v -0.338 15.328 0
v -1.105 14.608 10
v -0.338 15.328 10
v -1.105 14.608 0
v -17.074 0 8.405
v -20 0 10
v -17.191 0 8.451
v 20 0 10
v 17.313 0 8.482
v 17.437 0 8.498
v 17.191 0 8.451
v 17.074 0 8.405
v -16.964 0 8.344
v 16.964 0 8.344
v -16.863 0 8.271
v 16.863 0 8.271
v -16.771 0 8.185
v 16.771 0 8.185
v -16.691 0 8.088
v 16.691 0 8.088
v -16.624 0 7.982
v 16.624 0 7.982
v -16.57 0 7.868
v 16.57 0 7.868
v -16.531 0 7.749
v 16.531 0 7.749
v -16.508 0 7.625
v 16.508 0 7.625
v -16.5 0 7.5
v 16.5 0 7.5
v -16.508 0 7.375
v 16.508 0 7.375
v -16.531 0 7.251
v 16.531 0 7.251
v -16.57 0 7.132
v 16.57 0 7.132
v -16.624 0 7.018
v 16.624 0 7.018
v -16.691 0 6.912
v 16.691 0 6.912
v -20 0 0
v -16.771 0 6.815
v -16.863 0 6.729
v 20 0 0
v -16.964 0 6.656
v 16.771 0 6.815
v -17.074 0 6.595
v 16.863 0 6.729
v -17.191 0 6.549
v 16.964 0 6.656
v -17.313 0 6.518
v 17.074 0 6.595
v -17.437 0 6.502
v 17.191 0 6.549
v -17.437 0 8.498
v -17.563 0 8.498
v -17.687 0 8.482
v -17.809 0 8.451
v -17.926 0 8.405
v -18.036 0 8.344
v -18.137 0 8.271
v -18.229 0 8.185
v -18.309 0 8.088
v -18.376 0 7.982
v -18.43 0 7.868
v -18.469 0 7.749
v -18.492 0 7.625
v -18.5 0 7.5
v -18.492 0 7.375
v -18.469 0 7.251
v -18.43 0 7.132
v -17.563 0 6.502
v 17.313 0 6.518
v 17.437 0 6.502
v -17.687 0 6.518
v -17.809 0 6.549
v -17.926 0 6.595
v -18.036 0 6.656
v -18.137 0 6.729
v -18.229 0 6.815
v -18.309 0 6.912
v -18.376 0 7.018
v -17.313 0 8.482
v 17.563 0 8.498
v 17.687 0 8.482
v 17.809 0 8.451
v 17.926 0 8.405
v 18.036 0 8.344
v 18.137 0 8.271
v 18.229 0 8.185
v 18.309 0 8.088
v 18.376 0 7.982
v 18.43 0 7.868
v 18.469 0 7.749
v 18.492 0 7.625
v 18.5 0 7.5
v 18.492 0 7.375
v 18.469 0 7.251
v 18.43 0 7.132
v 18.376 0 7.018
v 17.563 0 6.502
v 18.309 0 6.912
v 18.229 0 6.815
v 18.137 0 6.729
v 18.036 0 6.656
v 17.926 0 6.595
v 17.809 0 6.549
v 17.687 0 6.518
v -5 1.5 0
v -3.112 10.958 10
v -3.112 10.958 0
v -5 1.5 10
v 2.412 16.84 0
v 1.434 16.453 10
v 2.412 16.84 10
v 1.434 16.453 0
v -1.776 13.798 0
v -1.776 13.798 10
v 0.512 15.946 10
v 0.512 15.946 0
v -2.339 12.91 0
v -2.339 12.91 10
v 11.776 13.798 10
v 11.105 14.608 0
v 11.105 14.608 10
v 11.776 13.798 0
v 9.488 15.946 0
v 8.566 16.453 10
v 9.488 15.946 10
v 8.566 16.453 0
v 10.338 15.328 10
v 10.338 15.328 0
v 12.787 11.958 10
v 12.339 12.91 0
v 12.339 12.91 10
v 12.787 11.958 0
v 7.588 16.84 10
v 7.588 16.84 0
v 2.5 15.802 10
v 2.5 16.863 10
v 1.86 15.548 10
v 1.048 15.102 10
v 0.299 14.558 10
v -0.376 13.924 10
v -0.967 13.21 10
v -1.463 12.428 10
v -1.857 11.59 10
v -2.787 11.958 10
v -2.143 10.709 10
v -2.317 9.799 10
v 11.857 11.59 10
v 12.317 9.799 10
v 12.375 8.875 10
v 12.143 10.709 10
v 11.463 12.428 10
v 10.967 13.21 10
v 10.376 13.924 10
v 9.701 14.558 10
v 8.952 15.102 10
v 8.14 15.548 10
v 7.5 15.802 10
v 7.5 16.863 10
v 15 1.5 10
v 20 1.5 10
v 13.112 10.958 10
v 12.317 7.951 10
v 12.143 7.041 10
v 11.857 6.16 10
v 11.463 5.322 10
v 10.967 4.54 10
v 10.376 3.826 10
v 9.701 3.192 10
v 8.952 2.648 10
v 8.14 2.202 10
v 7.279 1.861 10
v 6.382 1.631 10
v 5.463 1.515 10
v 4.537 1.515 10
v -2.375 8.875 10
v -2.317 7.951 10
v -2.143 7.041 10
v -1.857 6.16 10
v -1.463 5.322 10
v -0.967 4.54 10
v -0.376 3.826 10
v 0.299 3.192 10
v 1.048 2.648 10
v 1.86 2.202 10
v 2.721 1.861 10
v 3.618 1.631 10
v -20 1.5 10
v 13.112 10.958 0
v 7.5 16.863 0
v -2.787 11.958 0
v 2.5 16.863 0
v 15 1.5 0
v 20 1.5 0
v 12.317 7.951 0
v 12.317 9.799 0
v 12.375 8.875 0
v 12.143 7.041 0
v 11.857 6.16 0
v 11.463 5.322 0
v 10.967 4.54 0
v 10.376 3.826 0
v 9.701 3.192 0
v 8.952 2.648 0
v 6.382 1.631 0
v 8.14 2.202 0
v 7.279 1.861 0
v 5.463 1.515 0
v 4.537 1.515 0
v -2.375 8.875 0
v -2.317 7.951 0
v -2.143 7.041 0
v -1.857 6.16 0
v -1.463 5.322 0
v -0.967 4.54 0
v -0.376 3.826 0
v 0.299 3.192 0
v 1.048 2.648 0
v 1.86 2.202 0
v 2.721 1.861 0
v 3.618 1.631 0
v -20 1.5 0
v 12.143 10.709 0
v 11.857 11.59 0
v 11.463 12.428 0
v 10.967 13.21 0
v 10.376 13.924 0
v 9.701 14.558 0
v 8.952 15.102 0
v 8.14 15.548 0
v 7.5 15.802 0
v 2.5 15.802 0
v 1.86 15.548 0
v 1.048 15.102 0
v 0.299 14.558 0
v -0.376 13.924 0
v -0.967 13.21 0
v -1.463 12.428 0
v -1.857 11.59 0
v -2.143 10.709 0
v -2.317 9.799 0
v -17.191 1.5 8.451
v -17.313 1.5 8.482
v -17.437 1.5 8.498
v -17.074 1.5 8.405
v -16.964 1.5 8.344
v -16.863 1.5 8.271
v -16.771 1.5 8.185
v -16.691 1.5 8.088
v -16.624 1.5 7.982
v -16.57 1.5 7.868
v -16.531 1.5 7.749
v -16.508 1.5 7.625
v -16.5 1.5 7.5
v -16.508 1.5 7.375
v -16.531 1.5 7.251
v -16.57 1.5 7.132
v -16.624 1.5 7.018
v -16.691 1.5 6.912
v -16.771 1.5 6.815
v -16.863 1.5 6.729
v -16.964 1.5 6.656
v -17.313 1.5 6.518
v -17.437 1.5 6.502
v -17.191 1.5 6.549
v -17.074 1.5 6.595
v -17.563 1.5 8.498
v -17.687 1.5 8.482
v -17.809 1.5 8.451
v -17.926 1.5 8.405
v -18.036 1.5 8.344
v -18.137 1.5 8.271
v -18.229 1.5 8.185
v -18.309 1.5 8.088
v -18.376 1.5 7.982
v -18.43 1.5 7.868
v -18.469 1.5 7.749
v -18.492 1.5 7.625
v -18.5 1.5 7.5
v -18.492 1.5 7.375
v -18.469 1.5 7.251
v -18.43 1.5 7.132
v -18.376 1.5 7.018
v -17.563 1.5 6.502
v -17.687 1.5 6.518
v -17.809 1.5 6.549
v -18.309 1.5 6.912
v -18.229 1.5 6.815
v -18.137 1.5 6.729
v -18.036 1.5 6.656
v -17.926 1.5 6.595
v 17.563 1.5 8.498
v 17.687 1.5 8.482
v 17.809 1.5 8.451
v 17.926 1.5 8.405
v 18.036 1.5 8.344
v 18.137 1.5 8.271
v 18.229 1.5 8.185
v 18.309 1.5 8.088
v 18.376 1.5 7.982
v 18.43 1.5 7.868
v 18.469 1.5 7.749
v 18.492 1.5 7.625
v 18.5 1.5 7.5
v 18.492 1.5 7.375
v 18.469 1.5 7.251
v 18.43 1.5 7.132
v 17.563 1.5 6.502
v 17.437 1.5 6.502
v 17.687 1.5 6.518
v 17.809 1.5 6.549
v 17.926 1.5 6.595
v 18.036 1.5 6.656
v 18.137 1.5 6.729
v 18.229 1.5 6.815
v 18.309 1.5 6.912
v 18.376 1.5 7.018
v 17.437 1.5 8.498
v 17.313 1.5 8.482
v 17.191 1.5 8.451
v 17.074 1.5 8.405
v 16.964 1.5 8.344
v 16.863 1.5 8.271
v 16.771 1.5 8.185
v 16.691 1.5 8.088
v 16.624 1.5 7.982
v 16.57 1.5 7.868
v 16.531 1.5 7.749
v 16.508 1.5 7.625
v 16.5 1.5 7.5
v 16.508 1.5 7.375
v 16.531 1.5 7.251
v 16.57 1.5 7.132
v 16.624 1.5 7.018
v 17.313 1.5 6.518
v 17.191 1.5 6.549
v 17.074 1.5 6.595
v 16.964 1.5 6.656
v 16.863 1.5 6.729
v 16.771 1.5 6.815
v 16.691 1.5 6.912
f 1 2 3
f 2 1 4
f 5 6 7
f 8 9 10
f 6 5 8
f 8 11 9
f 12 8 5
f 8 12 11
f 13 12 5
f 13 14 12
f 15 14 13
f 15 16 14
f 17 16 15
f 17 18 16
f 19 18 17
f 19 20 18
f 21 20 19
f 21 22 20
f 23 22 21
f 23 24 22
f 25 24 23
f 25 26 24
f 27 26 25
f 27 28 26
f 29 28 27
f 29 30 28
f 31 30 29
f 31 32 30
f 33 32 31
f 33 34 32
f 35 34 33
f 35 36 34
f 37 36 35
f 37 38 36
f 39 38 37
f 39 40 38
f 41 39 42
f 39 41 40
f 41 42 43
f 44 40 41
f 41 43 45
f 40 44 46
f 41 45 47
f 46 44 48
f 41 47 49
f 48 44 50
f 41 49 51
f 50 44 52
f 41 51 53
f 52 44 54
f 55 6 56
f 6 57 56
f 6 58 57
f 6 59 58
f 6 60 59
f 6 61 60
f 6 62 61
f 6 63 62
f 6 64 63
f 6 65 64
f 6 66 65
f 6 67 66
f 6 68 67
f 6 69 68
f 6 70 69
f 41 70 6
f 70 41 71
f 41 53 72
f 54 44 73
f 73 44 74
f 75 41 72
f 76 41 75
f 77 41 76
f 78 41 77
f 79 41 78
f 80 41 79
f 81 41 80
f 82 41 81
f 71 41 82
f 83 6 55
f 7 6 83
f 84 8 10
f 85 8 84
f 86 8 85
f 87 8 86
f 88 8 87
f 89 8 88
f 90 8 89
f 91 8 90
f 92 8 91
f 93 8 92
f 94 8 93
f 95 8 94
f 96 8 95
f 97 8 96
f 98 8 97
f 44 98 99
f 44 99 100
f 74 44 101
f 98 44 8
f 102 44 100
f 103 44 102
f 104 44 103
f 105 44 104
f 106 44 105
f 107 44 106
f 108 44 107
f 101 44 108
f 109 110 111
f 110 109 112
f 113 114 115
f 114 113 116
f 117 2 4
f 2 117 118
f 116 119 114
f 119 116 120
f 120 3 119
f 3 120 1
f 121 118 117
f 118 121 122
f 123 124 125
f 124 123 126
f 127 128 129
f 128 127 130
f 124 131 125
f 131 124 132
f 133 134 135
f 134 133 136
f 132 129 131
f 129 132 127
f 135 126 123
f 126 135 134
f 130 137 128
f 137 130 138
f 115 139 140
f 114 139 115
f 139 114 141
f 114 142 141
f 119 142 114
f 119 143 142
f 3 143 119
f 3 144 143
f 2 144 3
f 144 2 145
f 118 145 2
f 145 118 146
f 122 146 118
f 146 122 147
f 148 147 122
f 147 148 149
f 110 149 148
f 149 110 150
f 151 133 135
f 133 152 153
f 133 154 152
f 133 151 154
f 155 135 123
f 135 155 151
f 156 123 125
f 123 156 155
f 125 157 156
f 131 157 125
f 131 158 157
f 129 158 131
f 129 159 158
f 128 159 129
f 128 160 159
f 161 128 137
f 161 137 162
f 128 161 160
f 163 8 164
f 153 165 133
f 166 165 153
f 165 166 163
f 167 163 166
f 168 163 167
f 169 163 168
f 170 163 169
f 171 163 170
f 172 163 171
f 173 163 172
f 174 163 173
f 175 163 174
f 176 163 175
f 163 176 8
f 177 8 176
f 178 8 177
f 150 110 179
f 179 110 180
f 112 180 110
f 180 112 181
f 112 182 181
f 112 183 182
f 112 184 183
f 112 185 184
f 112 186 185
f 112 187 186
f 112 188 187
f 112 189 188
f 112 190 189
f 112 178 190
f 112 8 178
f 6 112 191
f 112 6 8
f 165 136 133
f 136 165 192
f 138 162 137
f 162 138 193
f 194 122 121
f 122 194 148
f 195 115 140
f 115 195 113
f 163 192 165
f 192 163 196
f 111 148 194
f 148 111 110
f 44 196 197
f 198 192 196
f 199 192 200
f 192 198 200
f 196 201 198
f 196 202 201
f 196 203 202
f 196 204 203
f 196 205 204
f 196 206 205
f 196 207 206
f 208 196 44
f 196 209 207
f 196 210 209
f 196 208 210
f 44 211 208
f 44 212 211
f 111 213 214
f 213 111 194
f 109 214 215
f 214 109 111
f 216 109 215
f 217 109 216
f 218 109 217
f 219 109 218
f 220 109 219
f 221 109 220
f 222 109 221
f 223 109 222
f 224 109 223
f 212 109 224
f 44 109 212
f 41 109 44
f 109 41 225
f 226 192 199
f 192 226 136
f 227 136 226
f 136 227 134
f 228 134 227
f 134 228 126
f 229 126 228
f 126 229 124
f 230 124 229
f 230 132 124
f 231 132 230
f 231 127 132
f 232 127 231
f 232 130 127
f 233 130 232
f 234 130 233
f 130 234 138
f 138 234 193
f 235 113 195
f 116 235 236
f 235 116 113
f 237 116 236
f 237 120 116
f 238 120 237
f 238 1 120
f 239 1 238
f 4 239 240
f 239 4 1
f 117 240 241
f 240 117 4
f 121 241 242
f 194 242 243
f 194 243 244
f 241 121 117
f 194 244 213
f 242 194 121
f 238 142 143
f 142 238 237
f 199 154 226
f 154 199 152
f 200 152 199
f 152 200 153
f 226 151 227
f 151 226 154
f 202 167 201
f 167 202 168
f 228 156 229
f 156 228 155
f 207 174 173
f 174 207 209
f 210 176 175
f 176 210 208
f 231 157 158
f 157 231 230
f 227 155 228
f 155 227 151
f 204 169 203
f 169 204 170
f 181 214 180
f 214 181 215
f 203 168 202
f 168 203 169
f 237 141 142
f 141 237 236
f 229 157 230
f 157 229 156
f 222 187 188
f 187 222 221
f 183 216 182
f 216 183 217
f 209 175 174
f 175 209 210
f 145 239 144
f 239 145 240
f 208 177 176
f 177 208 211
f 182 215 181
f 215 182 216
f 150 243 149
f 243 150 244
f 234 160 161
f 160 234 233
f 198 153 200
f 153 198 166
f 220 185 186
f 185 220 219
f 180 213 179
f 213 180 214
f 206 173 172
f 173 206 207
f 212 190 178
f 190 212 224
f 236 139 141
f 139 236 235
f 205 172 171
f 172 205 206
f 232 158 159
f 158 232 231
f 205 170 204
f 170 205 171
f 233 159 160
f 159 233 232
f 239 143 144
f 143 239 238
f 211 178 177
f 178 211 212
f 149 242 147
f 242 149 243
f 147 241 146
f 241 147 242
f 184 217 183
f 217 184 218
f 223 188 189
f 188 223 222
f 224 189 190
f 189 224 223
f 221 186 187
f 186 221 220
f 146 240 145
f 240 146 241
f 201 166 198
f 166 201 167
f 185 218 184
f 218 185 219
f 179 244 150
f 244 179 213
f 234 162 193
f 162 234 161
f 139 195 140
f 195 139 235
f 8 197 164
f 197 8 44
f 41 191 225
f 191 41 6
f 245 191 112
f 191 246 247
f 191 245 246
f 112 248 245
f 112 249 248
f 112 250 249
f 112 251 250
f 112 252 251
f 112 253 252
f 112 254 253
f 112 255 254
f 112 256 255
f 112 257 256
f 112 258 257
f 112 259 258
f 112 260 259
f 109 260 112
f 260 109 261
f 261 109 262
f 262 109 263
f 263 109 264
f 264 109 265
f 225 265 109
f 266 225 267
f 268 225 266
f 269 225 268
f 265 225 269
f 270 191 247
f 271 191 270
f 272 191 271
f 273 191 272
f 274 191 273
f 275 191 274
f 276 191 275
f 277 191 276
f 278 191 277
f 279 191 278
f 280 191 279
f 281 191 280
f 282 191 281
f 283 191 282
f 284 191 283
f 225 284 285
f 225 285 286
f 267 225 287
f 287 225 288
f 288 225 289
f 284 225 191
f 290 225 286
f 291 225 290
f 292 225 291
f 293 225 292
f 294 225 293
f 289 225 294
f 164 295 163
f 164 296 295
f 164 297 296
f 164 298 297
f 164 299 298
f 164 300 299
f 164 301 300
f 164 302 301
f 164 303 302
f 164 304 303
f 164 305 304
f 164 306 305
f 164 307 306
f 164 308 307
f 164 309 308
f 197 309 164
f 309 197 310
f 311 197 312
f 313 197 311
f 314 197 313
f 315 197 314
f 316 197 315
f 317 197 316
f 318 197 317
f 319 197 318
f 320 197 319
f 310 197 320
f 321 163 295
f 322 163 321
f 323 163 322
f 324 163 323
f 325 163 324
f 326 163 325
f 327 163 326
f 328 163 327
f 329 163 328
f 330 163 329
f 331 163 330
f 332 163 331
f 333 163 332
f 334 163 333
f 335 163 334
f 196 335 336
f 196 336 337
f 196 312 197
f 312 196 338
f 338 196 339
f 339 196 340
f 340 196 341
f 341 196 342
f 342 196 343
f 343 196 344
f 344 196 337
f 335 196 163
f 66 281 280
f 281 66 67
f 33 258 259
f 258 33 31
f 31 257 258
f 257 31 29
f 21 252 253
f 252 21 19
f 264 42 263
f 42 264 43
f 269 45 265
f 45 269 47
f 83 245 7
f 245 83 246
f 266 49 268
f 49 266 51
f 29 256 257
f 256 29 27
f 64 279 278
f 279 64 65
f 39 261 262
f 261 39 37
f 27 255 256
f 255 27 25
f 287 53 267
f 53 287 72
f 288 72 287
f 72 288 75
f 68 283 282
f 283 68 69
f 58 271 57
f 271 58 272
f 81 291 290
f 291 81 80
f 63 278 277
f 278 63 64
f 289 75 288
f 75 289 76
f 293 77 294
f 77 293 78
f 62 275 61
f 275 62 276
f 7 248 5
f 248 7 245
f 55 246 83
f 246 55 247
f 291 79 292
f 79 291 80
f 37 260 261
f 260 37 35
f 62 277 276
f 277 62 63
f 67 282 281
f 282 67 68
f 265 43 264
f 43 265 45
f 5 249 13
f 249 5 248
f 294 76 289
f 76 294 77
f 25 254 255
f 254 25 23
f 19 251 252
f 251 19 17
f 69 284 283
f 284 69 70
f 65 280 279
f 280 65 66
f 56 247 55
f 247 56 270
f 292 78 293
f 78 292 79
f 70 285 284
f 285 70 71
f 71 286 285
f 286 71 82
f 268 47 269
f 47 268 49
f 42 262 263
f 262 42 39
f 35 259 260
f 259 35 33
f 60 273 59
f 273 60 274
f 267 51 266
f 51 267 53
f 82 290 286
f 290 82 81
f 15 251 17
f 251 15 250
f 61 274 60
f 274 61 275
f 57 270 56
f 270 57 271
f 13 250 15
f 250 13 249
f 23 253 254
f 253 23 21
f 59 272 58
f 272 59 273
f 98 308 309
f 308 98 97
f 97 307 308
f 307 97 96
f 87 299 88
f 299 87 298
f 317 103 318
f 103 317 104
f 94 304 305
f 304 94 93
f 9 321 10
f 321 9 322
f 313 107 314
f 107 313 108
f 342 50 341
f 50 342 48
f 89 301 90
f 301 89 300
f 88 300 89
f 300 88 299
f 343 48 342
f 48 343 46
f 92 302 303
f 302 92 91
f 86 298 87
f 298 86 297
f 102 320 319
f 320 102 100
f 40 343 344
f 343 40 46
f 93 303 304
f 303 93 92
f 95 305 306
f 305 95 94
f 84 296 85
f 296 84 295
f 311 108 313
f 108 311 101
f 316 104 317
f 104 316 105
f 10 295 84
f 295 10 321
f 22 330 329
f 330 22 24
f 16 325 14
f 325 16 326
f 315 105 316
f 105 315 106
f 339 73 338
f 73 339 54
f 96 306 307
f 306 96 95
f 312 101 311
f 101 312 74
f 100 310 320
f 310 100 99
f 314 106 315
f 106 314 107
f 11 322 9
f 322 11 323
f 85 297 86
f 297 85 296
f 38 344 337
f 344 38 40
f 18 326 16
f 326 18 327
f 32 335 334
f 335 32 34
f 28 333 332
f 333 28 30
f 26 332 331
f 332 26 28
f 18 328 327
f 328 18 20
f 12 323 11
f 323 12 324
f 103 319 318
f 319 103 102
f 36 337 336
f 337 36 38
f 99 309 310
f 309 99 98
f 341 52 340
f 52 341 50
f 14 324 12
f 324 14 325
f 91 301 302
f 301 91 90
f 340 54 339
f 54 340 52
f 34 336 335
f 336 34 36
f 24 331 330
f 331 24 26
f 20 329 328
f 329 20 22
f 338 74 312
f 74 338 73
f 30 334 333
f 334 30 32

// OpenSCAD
HEIGHT = 10;
THICKNESS = 1;

BASE_PLATE_WIDTH = 40;
BASE_PLATE_CLAMP_WIDTH = 20;
BASE_PLATE_THICKNESS = 1.5;

FAN_MOUNT_SPACING = 35;
FAN_MOUNT_DIA = 2;

PIPE_DIA = 14.75;
PIPE_OFFSET_Y = BASE_PLATE_THICKNESS + PIPE_DIA/2;
PIPE_OFFSET_X = 5;
PIPE_CLAMP_GAP_WIDTH = 5;

$fn = 50;

difference() {
    union() {
        translate([PIPE_OFFSET_X, 0, 0])
        difference() {
            hull() {
                translate([0, PIPE_OFFSET_Y, 0])
                cylinder(d = PIPE_DIA + 2 * THICKNESS, h = HEIGHT);
                translate([-BASE_PLATE_CLAMP_WIDTH/2, 0, 0])
                cube(size = [BASE_PLATE_CLAMP_WIDTH, BASE_PLATE_THICKNESS, HEIGHT]);
            }
            translate([0, PIPE_OFFSET_Y, 0])
            cylinder(d = PIPE_DIA, h = HEIGHT);
            translate([-PIPE_CLAMP_GAP_WIDTH/2, PIPE_DIA/2 + PIPE_OFFSET_Y - THICKNESS, 0])
            cube(size = [PIPE_CLAMP_GAP_WIDTH, 2 * THICKNESS, HEIGHT]);
        }
        translate([-BASE_PLATE_WIDTH/2, 0, 0])
        cube(size = [BASE_PLATE_WIDTH, BASE_PLATE_THICKNESS, HEIGHT]);    
    }
    
    #for(i = [-1, 1]) {
        translate([i * FAN_MOUNT_SPACING/2, 0, HEIGHT - (BASE_PLATE_WIDTH - FAN_MOUNT_SPACING)/2])
        rotate([-90, 0, 0])
        cylinder(d = FAN_MOUNT_DIA, h = HEIGHT);
    }
}
